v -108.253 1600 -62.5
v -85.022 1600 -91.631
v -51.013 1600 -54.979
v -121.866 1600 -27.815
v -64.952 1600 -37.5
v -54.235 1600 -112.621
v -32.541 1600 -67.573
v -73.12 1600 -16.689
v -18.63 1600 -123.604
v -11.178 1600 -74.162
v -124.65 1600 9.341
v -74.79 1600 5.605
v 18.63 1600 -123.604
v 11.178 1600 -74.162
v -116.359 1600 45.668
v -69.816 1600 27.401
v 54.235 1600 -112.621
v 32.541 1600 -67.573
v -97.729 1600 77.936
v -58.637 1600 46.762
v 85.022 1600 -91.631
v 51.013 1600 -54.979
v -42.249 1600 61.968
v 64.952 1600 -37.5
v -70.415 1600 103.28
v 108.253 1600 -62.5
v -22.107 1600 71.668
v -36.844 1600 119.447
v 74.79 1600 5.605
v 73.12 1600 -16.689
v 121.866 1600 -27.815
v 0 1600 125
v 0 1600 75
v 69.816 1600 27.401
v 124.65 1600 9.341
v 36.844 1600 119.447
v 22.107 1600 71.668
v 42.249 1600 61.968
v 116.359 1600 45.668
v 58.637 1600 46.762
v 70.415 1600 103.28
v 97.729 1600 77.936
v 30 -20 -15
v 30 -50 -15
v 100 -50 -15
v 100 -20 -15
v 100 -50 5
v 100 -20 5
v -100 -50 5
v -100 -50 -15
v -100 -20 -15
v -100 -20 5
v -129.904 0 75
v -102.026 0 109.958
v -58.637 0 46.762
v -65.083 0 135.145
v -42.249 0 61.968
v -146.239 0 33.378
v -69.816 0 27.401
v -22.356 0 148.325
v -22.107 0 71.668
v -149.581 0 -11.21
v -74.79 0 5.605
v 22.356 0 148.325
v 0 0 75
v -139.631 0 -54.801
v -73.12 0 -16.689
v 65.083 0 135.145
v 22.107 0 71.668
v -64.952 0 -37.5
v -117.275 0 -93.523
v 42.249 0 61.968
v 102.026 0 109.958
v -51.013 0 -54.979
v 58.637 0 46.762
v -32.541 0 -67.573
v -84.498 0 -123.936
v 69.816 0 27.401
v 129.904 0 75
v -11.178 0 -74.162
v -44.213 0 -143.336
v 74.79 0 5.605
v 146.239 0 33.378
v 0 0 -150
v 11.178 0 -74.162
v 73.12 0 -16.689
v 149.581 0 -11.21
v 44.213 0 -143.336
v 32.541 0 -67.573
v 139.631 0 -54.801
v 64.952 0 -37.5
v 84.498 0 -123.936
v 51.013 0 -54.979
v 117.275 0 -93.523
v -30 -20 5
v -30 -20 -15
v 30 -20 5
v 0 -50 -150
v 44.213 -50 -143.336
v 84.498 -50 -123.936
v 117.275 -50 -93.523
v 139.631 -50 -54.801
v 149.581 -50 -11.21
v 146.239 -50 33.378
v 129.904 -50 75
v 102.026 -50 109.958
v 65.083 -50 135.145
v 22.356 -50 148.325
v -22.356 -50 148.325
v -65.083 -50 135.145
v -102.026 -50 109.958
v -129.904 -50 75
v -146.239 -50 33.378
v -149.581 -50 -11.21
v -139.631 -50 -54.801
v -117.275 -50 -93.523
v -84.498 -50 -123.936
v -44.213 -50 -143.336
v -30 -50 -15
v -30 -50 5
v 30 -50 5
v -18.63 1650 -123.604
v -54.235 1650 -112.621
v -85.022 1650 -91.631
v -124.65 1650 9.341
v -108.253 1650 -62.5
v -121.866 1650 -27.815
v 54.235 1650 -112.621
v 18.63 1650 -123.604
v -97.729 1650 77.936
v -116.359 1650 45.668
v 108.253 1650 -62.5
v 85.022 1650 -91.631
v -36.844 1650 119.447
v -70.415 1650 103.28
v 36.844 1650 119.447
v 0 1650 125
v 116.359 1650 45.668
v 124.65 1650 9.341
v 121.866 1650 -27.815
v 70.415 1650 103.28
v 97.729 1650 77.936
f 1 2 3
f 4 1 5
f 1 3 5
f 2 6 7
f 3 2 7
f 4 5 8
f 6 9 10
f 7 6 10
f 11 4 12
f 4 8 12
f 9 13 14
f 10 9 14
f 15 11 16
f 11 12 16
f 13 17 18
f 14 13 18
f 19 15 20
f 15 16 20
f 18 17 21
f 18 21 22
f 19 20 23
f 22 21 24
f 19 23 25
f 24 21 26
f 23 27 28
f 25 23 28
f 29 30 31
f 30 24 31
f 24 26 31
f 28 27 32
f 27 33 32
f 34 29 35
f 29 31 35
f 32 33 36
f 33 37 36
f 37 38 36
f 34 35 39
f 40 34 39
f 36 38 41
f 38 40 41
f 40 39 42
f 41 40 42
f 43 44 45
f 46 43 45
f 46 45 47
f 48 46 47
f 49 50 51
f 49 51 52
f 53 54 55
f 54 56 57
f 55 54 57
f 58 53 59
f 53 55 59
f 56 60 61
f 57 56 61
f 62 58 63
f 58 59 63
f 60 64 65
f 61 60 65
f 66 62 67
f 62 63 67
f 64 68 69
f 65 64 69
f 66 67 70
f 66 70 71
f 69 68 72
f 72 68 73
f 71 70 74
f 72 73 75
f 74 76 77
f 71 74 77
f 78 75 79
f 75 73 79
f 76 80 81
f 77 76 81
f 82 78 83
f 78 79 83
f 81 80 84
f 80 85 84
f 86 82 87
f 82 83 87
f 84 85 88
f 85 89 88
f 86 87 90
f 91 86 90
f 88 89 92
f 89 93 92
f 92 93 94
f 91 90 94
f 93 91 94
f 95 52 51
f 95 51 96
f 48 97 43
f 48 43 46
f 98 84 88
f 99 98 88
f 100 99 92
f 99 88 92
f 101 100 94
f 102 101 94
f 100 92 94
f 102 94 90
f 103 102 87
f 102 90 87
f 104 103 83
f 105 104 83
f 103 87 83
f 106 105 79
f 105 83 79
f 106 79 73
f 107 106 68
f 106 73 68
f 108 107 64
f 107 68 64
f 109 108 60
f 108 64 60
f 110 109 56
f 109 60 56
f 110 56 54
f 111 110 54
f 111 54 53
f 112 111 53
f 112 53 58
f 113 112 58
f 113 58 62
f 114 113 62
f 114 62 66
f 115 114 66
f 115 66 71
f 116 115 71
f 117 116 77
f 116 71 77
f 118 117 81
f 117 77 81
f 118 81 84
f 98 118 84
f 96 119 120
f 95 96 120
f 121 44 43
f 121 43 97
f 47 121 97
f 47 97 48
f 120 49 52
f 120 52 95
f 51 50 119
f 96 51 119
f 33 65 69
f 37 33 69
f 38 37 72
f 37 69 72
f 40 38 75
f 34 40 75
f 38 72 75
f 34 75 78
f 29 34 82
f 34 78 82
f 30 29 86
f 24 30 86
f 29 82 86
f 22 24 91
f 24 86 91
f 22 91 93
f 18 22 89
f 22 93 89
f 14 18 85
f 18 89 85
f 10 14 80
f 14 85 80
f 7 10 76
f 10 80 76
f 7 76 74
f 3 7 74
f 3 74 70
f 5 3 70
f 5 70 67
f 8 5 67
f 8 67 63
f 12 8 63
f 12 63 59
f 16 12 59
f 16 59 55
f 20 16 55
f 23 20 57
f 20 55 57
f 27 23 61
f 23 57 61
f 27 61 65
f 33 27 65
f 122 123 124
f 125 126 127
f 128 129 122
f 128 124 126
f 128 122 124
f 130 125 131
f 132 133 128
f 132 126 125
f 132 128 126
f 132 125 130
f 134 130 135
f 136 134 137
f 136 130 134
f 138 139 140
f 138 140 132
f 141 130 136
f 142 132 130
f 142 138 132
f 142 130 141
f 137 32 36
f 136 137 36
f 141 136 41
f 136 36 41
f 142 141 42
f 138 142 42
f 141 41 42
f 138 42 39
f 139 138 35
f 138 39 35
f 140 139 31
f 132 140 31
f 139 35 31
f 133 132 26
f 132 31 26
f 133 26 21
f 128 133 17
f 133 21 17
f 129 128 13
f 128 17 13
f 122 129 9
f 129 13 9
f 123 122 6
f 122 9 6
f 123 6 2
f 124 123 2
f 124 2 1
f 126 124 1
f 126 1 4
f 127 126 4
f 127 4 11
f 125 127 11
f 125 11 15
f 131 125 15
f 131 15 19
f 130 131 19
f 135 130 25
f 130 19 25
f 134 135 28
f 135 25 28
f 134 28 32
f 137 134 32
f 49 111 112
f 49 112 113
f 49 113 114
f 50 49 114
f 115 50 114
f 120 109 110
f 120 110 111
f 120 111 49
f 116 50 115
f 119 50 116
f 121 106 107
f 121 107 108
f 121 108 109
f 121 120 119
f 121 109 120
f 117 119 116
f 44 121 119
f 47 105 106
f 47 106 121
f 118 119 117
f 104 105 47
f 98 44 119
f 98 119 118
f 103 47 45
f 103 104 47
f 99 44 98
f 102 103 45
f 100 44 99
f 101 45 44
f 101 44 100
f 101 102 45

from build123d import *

# Parameters (mm, degrees)
CROQUIS1_R              = 75
SALIENTE_EXTRUIR1_DEPTH = 1600
CROQUIS2_R              = 125
SALIENTE_EXTRUIR2_DEPTH = 50
CROQUIS3_R              = 150
SALIENTE_EXTRUIR3_DEPTH = 50
CROQUIS4_W              = 70
CROQUIS4_H              = 20
CORTAR_EXTRUIR1_DEPTH   = 30


with BuildPart() as part:
    # Croquis1 → Saliente-Extruir1 (new body)
    with BuildSketch(Plane(origin=(0, 0, 0), x_dir=(1, 0, 0), z_dir=(0, 1, 0))):
        with Locations(Location((0, 0, 0), (0, 0, 270))):
            Circle(CROQUIS1_R)
    extrude(amount=SALIENTE_EXTRUIR1_DEPTH)

    # Croquis2 → Saliente-Extruir2 (add)
    with BuildSketch(Plane(origin=(0, 1600, 0), x_dir=(1, 0, 0), z_dir=(0, 1, 0))):
        with Locations(Location((0, 0, 0), (0, 0, 270))):
            Circle(CROQUIS2_R)
    extrude(amount=SALIENTE_EXTRUIR2_DEPTH)

    # Croquis3 → Saliente-Extruir3 (add)
    with BuildSketch(Plane.XZ):
        with Locations(Location((0, 0, 0), (0, 0, 270))):
            Circle(CROQUIS3_R)
    extrude(amount=SALIENTE_EXTRUIR3_DEPTH)

    # Croquis4 → Cortar-Extruir1 (cut)
    with BuildSketch(Plane.XZ.offset(50)):
        with Locations((-65, -5)):
            Rectangle(CROQUIS4_W, CROQUIS4_H)
        with Locations((65, -5)):
            Rectangle(CROQUIS4_W, CROQUIS4_H)
    extrude(amount=-CORTAR_EXTRUIR1_DEPTH, mode=Mode.SUBTRACT)


solid = part.part
